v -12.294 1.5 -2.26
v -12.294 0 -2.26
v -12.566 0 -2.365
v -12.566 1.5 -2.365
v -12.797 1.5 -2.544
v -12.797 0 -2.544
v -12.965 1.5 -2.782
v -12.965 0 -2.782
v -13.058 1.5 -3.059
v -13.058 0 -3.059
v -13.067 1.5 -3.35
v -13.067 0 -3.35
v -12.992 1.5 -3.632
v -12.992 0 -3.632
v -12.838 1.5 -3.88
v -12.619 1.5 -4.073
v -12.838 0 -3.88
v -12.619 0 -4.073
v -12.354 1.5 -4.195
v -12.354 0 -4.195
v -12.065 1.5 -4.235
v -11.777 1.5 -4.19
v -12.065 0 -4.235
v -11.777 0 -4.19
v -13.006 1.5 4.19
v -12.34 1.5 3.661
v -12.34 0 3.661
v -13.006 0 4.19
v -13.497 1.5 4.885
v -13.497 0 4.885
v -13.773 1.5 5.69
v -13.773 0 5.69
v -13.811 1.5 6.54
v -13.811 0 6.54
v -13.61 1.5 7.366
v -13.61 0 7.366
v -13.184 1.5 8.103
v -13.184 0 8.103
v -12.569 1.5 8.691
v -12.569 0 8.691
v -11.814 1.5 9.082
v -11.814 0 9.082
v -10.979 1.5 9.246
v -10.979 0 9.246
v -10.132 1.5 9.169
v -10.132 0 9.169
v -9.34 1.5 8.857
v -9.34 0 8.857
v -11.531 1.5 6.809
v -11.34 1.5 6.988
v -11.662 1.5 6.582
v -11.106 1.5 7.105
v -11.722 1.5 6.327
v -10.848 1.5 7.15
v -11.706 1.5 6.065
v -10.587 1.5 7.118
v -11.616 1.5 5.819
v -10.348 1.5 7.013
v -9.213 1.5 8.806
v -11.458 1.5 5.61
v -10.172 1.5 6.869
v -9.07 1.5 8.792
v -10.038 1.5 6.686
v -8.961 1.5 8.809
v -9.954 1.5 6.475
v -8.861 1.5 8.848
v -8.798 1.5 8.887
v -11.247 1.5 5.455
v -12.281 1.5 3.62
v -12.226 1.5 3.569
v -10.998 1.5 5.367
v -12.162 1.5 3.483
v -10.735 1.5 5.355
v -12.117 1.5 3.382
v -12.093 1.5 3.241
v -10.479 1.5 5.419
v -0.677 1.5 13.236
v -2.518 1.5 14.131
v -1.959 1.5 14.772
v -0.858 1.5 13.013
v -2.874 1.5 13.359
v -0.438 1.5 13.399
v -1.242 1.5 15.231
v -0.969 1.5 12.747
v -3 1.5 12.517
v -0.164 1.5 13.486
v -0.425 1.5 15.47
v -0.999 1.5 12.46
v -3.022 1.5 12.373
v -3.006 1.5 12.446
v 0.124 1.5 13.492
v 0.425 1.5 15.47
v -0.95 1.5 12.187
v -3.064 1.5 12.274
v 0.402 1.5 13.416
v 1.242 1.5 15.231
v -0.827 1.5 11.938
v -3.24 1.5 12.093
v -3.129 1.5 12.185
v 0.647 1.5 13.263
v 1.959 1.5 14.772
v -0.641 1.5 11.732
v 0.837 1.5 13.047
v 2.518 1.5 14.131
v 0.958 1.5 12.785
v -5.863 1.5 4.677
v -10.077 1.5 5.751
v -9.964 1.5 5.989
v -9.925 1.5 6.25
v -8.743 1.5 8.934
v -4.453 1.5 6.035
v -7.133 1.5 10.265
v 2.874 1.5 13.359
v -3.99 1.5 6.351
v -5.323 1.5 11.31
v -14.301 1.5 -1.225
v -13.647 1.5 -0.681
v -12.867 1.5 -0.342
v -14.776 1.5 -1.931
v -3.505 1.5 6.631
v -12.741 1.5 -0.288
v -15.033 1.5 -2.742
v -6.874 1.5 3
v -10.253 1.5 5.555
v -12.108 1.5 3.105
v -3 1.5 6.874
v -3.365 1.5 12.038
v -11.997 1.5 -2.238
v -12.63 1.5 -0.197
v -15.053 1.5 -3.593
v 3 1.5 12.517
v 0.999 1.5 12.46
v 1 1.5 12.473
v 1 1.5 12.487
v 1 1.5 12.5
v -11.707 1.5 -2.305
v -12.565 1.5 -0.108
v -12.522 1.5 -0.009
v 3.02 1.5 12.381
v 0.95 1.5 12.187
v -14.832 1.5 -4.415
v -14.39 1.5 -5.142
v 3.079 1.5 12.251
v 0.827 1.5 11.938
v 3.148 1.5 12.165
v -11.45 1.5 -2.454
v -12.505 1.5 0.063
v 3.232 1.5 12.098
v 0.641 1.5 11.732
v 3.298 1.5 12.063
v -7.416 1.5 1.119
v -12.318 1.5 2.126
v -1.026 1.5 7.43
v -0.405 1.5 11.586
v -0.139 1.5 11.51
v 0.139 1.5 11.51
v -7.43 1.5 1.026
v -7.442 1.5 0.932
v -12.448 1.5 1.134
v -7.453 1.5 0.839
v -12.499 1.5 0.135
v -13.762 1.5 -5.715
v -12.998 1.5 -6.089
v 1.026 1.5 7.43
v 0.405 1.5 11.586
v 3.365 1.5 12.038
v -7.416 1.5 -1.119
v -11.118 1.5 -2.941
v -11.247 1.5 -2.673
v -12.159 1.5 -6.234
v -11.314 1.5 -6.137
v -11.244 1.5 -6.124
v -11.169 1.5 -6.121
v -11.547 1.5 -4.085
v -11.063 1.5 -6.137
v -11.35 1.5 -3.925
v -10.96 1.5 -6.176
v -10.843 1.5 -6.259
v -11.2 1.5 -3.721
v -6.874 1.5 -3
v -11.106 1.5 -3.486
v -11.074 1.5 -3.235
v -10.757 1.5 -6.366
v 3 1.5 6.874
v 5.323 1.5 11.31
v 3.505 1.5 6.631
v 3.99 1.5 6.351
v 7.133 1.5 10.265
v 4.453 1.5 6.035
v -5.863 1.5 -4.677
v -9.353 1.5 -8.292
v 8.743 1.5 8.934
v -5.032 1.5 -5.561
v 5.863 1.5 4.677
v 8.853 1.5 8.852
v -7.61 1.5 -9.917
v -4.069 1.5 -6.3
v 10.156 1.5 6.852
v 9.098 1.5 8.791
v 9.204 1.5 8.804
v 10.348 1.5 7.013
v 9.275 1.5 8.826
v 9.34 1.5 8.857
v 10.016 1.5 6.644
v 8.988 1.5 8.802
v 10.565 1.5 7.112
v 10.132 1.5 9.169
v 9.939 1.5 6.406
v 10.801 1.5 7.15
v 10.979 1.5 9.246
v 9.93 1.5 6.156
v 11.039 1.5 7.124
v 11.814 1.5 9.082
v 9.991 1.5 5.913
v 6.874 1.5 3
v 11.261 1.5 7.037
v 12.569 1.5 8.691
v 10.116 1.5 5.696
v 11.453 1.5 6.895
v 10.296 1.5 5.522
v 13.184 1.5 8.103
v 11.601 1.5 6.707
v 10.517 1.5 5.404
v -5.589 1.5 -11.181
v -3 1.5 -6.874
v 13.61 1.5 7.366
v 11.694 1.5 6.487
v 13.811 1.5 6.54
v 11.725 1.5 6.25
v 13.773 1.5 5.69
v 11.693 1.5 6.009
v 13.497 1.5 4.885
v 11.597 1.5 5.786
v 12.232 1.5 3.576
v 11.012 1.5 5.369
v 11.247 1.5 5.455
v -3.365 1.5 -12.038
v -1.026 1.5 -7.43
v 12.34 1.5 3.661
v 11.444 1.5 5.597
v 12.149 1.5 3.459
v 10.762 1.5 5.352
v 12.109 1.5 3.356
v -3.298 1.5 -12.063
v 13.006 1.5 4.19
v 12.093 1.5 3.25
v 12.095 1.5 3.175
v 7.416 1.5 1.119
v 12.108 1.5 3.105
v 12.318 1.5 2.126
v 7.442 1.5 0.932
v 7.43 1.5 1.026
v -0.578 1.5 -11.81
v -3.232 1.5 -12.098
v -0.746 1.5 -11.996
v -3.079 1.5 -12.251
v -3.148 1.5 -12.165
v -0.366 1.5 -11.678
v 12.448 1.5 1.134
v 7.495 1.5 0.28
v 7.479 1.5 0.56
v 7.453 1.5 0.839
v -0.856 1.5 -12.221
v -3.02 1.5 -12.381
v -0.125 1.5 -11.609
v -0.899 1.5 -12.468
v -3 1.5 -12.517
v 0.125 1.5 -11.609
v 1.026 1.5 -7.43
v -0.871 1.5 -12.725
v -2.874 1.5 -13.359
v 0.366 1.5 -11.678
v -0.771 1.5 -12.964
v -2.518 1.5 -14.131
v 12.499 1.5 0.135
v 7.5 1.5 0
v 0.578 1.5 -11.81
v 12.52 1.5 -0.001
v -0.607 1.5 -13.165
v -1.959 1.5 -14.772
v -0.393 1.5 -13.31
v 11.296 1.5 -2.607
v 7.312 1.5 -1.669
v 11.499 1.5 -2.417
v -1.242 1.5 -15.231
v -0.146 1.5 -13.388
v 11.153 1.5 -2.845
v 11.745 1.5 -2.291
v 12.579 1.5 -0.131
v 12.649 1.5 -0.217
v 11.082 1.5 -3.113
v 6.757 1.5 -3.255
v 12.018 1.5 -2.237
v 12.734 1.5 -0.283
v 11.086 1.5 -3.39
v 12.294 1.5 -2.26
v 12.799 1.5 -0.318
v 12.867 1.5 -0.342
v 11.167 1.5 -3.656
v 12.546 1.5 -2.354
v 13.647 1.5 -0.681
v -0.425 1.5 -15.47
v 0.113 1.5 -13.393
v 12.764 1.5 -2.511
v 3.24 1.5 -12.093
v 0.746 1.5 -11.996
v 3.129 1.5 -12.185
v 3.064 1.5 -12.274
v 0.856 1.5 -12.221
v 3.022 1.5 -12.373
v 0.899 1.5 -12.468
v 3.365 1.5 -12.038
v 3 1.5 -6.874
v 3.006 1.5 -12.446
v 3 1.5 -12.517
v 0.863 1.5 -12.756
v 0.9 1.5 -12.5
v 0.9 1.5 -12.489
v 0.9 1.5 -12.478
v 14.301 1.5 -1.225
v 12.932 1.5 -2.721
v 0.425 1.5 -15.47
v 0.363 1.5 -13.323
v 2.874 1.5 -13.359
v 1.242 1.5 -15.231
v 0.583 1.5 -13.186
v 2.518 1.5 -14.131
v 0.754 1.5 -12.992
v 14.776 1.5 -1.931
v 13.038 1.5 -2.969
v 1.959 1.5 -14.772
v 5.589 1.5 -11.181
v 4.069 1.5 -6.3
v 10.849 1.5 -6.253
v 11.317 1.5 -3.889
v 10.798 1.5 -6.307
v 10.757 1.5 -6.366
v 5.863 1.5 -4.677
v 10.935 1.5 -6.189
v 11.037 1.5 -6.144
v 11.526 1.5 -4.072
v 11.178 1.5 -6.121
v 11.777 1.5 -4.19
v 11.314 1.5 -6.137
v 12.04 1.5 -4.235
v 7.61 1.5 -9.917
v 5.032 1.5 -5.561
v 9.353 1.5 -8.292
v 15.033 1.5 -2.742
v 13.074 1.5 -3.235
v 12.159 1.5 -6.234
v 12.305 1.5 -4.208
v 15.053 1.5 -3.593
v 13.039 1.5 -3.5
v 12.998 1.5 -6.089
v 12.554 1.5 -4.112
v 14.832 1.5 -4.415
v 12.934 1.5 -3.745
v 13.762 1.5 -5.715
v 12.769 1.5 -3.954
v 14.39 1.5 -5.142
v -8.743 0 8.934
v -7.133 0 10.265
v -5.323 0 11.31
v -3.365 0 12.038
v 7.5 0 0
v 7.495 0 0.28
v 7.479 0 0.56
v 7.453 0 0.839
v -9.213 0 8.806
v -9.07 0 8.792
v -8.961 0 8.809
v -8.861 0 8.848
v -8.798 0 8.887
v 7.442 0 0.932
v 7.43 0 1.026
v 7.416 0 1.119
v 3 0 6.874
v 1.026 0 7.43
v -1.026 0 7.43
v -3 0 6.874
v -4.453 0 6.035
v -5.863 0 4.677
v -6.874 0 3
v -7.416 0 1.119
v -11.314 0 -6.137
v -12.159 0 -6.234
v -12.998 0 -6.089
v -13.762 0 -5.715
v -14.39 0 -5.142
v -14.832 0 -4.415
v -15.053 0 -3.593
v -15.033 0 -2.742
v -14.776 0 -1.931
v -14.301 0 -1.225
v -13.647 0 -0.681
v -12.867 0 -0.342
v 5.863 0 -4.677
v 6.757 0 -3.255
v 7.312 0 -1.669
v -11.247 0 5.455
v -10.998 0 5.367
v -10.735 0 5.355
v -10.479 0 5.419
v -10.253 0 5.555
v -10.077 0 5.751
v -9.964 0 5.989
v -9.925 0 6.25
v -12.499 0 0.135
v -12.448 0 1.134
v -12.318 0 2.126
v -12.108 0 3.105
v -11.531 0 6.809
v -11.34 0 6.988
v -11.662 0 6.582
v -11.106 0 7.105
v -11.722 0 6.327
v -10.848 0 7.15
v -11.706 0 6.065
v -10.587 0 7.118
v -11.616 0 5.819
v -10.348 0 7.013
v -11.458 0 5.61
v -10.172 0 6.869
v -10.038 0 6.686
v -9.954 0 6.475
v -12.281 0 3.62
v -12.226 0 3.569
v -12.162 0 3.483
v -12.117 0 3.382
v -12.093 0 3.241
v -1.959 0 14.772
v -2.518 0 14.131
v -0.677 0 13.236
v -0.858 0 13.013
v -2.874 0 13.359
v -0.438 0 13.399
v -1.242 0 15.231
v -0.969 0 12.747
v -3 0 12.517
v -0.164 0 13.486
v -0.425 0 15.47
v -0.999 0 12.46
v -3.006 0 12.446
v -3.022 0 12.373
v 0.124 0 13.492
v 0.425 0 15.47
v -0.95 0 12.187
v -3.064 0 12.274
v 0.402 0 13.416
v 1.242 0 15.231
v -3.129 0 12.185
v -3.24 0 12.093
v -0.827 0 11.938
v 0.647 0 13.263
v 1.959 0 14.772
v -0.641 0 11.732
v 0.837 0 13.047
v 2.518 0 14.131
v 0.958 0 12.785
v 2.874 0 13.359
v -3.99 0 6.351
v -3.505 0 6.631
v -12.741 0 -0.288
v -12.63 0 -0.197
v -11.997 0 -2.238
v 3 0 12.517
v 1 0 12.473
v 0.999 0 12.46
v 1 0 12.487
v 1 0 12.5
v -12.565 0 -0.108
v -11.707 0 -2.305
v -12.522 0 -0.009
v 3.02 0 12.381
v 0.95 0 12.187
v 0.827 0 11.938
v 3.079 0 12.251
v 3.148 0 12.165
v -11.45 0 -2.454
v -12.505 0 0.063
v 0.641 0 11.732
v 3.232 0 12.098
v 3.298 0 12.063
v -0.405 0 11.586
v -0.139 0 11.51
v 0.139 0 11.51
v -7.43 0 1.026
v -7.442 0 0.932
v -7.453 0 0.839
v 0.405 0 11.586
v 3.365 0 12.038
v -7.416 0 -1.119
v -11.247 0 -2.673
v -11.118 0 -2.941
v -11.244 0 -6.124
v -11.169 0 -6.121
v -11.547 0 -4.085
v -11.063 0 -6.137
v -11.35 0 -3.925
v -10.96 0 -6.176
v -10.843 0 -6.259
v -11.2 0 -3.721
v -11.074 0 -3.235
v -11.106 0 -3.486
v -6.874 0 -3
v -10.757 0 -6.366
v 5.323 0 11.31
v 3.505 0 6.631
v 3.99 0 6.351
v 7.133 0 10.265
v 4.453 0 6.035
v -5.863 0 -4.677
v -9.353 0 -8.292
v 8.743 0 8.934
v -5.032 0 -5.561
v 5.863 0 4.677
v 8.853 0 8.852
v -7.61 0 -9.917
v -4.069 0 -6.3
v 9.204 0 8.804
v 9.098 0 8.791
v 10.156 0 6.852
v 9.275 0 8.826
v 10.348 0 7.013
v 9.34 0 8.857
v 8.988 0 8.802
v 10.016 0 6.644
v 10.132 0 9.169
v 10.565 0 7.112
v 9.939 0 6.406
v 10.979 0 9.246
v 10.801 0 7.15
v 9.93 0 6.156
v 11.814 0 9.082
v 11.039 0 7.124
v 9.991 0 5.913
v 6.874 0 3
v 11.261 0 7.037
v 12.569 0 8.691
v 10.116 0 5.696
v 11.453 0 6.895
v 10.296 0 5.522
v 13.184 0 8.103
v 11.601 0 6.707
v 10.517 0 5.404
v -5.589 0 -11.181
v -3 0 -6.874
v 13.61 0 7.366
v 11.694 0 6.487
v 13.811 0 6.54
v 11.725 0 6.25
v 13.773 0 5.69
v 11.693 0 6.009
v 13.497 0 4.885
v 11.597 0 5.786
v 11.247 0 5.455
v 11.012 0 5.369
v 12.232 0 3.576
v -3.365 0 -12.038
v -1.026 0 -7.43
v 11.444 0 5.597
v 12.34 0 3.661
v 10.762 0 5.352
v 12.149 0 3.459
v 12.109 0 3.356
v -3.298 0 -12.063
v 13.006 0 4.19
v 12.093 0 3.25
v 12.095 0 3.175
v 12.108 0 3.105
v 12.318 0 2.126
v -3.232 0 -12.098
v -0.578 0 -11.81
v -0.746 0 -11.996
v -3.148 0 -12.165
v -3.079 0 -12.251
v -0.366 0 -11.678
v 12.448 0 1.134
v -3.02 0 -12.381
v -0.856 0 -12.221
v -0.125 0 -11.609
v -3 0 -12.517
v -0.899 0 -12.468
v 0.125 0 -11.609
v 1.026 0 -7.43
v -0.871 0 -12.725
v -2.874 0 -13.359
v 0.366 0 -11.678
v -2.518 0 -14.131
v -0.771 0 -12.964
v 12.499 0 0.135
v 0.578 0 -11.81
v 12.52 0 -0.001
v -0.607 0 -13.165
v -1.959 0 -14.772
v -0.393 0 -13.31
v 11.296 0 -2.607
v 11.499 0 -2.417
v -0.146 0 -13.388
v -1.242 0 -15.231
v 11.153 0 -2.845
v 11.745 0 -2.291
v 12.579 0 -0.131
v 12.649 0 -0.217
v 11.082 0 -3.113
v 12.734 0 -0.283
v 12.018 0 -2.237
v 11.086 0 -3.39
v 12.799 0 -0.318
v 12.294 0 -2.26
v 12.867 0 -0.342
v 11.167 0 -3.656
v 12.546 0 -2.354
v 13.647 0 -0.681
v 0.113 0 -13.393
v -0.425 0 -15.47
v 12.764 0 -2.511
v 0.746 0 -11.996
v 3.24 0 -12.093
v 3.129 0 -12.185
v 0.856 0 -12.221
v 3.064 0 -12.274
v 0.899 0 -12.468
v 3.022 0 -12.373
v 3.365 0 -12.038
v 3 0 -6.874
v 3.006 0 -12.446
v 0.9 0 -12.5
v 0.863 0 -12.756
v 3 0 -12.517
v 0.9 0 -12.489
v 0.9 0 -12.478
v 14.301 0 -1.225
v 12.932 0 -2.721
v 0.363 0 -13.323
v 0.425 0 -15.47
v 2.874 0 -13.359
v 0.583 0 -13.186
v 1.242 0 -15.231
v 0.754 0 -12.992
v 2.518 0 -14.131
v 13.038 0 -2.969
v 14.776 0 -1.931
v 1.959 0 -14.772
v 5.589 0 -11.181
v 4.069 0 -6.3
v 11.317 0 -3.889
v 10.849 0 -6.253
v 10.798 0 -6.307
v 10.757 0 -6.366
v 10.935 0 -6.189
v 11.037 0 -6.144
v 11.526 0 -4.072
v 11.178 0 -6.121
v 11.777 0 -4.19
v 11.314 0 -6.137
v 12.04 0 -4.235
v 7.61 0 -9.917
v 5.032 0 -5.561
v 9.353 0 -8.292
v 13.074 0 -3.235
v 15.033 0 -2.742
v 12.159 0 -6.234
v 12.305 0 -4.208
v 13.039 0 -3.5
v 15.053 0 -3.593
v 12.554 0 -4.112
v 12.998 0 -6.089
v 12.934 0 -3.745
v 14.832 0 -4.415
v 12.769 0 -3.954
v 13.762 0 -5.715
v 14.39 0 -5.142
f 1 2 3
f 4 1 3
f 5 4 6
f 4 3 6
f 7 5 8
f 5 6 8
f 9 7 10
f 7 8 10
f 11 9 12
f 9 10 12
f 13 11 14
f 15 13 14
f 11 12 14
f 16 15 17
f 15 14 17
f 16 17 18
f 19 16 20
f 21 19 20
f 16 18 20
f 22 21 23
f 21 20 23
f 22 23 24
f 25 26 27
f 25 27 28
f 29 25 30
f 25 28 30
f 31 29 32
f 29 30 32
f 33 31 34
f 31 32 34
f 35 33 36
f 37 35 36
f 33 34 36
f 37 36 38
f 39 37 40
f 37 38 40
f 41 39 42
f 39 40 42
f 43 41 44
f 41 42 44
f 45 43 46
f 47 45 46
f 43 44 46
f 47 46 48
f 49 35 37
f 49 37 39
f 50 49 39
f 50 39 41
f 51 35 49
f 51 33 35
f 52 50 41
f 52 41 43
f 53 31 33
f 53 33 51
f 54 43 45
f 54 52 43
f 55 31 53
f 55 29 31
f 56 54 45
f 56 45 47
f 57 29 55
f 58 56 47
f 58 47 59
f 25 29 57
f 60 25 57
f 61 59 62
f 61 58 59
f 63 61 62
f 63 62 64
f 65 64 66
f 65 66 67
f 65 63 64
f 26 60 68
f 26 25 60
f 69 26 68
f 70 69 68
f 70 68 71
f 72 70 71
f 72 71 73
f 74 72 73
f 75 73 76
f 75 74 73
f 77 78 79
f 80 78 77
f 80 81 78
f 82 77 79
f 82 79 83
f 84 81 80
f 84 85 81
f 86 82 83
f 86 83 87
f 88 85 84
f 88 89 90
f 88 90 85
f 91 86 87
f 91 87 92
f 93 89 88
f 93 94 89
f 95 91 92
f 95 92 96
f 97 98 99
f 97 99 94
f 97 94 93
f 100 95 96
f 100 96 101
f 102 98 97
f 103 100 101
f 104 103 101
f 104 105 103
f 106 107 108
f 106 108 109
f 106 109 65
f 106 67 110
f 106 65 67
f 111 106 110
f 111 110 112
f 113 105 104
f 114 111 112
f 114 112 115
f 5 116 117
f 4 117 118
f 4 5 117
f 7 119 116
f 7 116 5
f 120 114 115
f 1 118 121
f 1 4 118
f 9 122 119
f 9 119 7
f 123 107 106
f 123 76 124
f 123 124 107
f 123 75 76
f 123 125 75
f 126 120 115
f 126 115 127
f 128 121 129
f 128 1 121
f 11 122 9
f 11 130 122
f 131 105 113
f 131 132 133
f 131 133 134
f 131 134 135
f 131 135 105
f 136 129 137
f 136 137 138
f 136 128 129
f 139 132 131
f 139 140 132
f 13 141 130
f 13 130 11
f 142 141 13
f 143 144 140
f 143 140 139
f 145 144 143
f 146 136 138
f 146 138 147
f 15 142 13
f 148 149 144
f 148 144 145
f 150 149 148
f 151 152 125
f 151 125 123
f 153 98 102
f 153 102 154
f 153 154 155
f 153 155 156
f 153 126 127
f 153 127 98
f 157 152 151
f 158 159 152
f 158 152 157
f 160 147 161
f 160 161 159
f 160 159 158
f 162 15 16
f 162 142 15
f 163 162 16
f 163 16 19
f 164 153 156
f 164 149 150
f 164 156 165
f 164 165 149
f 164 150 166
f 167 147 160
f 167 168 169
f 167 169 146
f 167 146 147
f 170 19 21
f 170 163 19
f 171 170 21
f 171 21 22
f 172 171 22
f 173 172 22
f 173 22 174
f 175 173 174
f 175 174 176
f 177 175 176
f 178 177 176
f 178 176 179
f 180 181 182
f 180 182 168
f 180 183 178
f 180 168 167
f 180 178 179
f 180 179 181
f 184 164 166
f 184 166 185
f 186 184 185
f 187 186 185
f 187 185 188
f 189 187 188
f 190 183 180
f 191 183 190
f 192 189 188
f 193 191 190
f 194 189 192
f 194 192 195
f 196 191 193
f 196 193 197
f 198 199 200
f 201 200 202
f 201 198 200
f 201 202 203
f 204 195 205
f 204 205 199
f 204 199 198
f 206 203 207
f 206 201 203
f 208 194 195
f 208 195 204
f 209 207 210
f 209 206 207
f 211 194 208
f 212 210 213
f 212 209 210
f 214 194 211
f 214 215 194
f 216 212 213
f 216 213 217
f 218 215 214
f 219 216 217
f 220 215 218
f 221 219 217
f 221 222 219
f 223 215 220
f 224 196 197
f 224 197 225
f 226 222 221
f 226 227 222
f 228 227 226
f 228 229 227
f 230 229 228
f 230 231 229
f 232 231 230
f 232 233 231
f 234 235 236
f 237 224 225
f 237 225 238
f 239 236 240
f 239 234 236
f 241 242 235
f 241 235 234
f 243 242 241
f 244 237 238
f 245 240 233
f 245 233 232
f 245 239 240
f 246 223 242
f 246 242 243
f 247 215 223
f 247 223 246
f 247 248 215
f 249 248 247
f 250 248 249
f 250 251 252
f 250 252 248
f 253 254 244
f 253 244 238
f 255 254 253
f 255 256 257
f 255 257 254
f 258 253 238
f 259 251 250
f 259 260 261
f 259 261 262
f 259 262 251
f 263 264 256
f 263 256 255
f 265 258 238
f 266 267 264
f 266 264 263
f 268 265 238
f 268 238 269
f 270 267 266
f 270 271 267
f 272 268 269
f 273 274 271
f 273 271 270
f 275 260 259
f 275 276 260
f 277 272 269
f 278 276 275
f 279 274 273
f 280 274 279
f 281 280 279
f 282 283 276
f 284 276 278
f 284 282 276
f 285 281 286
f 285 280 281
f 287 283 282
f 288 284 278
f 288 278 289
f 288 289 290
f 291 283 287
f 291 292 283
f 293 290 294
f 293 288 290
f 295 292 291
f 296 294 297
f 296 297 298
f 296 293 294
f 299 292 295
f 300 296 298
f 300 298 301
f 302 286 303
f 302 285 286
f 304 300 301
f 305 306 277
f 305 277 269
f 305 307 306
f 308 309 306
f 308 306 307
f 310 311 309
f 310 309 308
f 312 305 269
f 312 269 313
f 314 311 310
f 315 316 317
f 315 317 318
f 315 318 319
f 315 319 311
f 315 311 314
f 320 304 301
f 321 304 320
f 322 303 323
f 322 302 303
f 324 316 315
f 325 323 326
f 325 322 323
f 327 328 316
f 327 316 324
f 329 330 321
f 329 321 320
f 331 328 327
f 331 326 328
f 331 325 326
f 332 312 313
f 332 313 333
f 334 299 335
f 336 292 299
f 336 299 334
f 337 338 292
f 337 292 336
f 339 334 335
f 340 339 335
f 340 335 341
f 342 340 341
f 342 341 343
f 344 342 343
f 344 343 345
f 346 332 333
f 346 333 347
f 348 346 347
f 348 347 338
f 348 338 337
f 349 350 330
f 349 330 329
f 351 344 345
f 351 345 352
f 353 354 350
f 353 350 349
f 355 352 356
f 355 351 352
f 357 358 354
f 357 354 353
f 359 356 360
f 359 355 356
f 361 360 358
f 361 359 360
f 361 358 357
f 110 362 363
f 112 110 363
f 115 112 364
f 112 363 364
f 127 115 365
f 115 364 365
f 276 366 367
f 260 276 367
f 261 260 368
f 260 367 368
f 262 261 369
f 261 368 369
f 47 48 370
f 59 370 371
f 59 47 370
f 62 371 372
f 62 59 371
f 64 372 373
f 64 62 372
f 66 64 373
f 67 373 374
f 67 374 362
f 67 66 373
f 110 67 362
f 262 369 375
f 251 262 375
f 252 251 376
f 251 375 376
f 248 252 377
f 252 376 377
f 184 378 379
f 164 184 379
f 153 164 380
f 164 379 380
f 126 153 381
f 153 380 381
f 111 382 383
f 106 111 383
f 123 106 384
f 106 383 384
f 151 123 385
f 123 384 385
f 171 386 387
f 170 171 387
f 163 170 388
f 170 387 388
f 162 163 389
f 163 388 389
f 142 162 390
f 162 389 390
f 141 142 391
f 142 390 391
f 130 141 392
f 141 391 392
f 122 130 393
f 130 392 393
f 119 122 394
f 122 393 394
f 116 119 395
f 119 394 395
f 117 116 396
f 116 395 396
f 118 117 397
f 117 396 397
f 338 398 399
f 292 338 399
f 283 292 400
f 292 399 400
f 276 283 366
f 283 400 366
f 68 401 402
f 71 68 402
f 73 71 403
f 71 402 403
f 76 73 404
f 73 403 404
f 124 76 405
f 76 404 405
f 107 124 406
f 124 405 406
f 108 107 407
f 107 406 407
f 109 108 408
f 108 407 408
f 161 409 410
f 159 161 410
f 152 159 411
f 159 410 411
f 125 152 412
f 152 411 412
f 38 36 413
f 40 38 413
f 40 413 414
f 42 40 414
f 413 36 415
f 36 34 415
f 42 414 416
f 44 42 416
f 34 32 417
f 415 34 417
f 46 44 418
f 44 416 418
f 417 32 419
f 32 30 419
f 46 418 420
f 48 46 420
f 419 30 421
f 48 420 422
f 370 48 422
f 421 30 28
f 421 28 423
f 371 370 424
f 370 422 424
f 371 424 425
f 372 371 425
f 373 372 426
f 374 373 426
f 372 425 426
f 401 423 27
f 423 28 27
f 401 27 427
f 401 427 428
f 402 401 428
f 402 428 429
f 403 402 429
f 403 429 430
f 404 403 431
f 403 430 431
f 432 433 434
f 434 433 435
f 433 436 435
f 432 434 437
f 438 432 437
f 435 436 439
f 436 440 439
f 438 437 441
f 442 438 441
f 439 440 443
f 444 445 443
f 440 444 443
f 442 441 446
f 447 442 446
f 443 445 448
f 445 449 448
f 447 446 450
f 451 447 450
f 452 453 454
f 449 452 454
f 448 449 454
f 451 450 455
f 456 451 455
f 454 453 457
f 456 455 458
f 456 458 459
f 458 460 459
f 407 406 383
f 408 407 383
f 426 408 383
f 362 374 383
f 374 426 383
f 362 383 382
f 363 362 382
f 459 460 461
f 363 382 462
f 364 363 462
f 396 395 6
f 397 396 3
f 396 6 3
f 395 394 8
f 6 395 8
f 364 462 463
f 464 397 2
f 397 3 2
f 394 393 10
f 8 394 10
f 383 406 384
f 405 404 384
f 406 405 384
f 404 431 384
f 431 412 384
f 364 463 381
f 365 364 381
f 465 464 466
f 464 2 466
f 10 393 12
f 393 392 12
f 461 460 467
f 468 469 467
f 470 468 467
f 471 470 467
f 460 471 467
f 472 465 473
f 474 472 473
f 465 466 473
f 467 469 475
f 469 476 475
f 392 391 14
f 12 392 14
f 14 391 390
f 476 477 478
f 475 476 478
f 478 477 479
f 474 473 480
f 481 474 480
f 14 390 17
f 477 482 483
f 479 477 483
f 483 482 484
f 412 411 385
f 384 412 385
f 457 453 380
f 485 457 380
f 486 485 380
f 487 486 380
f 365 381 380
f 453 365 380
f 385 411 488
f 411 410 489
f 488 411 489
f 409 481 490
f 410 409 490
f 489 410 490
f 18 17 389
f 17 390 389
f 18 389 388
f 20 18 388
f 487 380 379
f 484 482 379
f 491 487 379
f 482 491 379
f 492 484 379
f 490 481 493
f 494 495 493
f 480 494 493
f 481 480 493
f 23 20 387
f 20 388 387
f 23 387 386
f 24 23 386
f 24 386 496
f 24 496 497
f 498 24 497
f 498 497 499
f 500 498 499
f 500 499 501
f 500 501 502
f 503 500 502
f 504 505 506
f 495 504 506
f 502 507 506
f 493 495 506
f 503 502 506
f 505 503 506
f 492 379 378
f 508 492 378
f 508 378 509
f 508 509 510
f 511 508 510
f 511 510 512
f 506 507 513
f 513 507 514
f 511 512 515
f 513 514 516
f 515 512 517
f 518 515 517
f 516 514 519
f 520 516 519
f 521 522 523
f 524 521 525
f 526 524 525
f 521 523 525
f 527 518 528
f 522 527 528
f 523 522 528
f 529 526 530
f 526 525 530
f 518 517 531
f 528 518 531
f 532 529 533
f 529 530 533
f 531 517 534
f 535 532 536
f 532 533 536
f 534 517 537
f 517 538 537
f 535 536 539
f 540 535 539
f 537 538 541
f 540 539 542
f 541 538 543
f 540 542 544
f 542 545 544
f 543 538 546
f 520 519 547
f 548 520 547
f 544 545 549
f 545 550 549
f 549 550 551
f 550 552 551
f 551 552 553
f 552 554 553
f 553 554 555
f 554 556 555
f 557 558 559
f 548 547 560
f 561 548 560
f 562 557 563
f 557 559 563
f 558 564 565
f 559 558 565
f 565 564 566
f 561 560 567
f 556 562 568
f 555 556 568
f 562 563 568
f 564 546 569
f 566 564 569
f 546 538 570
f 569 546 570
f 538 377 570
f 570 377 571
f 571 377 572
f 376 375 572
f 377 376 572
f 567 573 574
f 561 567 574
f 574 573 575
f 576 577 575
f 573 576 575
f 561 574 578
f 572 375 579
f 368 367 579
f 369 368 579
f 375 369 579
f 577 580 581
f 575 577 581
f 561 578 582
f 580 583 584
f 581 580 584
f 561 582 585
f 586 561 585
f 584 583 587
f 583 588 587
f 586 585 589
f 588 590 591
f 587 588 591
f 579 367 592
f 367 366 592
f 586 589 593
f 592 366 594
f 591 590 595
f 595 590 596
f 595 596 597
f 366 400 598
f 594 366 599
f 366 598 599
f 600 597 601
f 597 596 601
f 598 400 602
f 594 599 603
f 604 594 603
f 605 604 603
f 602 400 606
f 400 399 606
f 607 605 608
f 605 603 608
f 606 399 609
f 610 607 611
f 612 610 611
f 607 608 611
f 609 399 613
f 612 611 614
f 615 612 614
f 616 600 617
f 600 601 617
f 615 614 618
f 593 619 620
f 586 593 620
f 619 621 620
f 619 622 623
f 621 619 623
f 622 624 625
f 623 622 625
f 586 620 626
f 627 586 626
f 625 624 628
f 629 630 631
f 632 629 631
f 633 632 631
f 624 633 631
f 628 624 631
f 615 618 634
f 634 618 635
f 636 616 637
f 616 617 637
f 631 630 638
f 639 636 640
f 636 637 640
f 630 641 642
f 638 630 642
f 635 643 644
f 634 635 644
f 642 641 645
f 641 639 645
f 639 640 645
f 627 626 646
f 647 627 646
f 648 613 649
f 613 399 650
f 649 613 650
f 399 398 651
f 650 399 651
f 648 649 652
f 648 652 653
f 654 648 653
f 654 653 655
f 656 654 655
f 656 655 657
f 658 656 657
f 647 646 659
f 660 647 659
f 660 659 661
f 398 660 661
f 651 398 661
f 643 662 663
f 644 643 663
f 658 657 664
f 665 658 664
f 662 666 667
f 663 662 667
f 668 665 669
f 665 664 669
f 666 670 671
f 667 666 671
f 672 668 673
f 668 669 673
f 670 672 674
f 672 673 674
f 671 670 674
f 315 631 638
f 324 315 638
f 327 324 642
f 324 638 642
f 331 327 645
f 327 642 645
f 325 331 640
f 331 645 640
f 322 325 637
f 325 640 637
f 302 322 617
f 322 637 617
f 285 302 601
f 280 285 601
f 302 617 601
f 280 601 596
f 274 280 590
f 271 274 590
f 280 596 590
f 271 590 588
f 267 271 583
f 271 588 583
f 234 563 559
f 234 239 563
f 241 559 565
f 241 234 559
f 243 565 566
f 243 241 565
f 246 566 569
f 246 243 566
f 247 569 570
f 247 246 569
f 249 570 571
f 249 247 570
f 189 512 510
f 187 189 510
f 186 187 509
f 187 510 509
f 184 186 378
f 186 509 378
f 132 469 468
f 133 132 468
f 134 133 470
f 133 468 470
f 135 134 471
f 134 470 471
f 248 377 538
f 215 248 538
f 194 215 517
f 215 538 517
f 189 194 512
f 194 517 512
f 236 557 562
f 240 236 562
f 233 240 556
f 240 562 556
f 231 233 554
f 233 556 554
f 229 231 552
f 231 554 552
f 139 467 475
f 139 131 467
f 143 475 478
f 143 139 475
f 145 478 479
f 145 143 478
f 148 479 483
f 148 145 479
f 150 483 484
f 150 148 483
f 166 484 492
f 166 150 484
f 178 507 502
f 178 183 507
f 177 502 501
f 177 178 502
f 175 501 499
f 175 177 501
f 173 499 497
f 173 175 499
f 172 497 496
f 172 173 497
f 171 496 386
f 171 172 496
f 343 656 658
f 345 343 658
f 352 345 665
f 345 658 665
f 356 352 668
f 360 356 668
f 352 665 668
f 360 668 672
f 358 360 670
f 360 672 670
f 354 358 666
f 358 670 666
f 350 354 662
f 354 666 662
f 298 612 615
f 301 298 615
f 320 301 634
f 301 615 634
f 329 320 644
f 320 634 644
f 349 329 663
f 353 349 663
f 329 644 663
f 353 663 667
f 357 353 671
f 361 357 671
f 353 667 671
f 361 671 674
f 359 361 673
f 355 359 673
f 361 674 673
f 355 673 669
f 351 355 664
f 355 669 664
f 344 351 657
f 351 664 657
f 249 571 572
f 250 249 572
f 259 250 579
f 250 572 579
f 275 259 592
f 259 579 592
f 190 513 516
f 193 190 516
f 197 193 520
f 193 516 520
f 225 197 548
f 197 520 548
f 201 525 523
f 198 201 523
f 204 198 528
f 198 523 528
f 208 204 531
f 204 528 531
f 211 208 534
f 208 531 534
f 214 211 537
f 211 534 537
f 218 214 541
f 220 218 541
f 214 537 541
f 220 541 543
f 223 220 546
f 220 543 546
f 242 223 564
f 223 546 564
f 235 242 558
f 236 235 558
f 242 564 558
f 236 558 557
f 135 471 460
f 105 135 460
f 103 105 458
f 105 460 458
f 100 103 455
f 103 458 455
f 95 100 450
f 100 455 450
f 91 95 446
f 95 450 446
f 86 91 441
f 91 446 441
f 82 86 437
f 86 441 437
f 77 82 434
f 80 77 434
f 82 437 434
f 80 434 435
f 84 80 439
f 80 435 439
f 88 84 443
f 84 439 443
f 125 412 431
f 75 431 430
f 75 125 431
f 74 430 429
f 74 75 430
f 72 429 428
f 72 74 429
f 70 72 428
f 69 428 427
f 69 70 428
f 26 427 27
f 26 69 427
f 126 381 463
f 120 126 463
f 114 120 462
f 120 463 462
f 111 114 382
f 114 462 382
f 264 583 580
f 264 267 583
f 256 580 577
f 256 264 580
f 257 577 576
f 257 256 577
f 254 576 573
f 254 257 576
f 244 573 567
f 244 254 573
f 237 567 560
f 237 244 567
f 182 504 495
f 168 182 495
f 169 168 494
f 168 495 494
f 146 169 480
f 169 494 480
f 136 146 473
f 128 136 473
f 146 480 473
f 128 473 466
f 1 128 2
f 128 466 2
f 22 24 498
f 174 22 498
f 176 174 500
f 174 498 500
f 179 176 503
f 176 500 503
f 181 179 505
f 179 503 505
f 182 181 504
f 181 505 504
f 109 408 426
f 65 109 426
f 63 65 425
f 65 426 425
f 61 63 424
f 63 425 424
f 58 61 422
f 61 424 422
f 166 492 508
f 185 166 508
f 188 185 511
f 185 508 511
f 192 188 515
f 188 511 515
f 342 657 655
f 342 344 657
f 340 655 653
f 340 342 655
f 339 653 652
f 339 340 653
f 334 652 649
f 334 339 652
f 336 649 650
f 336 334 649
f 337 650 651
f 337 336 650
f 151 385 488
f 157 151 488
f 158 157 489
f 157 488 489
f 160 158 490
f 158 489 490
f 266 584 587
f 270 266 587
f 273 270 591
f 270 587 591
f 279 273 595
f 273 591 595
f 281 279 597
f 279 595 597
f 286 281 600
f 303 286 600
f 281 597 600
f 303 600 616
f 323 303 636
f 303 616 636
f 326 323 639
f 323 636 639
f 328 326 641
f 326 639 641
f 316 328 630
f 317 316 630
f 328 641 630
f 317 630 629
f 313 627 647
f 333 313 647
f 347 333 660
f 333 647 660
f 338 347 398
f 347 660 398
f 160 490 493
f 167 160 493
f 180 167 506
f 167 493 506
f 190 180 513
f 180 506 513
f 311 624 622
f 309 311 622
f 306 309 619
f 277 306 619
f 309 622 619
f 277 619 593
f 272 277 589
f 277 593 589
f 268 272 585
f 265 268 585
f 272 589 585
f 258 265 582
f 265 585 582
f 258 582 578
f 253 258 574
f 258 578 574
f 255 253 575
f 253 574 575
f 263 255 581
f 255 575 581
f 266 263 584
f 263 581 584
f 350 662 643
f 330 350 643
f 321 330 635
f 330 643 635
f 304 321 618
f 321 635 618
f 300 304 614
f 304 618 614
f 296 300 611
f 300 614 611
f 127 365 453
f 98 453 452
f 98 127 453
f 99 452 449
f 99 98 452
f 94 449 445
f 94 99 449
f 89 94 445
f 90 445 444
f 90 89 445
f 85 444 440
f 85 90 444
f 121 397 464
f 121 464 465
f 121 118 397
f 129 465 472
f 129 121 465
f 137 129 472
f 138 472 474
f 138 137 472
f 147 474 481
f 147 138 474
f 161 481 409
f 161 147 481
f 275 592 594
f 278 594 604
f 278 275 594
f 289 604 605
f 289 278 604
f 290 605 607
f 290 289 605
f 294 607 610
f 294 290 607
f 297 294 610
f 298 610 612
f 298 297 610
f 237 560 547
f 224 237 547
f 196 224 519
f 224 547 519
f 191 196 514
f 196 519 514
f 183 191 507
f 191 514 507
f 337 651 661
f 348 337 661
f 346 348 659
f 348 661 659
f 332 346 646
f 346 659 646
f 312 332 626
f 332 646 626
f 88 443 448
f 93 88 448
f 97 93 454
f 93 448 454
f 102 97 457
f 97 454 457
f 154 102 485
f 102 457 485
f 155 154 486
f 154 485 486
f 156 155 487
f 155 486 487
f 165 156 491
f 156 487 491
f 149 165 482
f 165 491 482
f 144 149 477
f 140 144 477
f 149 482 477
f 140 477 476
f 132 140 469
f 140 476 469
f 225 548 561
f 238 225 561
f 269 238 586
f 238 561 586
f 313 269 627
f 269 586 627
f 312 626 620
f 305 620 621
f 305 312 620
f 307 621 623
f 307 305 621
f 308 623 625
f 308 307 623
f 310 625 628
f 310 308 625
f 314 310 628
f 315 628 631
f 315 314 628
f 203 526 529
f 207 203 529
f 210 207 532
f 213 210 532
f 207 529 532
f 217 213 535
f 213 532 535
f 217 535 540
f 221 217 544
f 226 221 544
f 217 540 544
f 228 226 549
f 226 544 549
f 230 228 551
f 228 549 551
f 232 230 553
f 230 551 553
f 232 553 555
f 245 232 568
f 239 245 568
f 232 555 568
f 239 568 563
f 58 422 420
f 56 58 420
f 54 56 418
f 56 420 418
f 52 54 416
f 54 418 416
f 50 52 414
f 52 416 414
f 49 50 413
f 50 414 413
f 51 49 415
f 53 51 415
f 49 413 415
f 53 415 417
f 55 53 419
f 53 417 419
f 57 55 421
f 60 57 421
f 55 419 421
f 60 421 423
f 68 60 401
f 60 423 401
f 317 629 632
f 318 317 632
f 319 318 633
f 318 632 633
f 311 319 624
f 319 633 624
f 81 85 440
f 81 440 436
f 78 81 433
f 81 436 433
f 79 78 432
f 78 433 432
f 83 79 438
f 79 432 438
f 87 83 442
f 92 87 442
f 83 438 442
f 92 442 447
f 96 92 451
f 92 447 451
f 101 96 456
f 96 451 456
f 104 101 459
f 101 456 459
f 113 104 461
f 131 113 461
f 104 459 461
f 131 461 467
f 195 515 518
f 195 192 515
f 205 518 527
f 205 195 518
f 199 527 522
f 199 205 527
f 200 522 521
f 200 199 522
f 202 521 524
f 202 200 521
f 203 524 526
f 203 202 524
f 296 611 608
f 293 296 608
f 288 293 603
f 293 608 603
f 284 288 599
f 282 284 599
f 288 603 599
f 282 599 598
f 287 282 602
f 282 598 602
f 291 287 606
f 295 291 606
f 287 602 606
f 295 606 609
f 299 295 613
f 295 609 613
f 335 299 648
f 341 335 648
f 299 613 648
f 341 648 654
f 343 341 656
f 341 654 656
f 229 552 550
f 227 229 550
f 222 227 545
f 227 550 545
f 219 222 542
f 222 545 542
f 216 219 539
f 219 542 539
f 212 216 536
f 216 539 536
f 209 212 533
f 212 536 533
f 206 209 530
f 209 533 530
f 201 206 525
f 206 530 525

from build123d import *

# Parameters (mm, degrees)
BOSS_EXTRUDE1_DEPTH = 1.5
FILLET1_R           = 0.5


with BuildPart() as part:
    # Sketch1 → Boss-Extrude1 (new body)
    with BuildSketch(Plane(origin=(0, 0, 0), x_dir=(1, 0, 0), z_dir=(0, 1, 0))):
        with BuildLine():
            ThreePointArc((0.899416611, 12.4676), (1.956802124, 12.345886985), (3, 12.1346611))
            Line((3, 12.1346611), (3, 12.5))
            ThreePointArc((3, 12.5), (0, 15.5), (-3, 12.5))
            Line((-3, 12.5), (-3, 12.1346611))
            ThreePointArc((-3, 12.1346611), (-1.956802124, 12.345886985), (-0.899416611, 12.4676))
            ThreePointArc((-0.899416611, 12.4676), (-0.016202626, 13.399854141), (0.9, 12.5))
            ThreePointArc((0.9, 12.5), (0.899854141, 12.483797374), (0.899416611, 12.4676))
        make_face()
        with BuildLine():
            ThreePointArc((-3, 6.873863542), (0, 7.5), (3, 6.873863542))
            Line((3, 6.873863542), (3, 12.1346611))
            ThreePointArc((3, 12.1346611), (1.956802124, 12.345886985), (0.899416611, 12.4676))
            ThreePointArc((0.899416611, 12.4676), (0, 11.6), (-0.899416611, 12.4676))
            ThreePointArc((-0.899416611, 12.4676), (-1.956802124, 12.345886985), (-3, 12.1346611))
            Line((-3, 12.1346611), (-3, 6.873863542))
        make_face()
        with BuildLine():
            Line((3, 12.1346611), (3, 6.873863542))
            ThreePointArc((3, 6.873863542), (4.565710718, 5.950150052), (5.863185187, 4.676864277))
            Line((5.863185187, 4.676864277), (10.944725414, 6.038458877))
            ThreePointArc((10.944725414, 6.038458877), (7.609517863, 9.916916754), (3, 12.1346611))
        make_face()
        with BuildLine():
            ThreePointArc((7.5, 0), (7.48822587, -0.420087268), (7.45294045, -0.83885556))
            Line((7.45294045, -0.83885556), (7.772310826, -1.023244132))
            Line((7.772310826, -1.023244132), (12.497639685, 0.24290392))
            ThreePointArc((12.497639685, 0.24290392), (12.43679381, 1.255451998), (12.294047703, 2.259732526))
            ThreePointArc((12.294047703, 2.259732526), (11.108147002, 2.976419019), (11.776823889, 4.190038078))
            ThreePointArc((11.776823889, 4.190038078), (11.39830538, 5.131143582), (10.944725414, 6.038458877))
            Line((10.944725414, 6.038458877), (5.863185187, 4.676864277))
            ThreePointArc((5.863185187, 4.676864277), (7.078979054, 2.477509949), (7.5, 0))
        make_face()
        with BuildLine():
            ThreePointArc((12.294047703, 2.259732526), (12.43679381, 1.255451998), (12.497639685, 0.24290392))
            Line((12.497639685, 0.24290392), (12.850529964, 0.337460585))
            ThreePointArc((12.850529964, 0.337460585), (14.971850307, 4.011695199), (11.297615693, 6.133015543))
            Line((11.297615693, 6.133015543), (10.944725414, 6.038458877))
            ThreePointArc((10.944725414, 6.038458877), (11.39830538, 5.131143582), (11.776823889, 4.190038078))
            ThreePointArc((11.776823889, 4.190038078), (12.666842202, 4.040610319), (13.074072829, 3.235238064))
            ThreePointArc((13.074072829, 3.235238064), (12.855089754, 2.610728206), (12.294047703, 2.259732526))
        make_face()
        with BuildLine():
            Line((12.497639685, 0.24290392), (7.772310826, -1.023244132))
            Line((7.772310826, -1.023244132), (12.008924778, -3.469254338))
            ThreePointArc((12.008924778, -3.469254338), (12.376622312, -1.751918986), (12.5, 0))
            ThreePointArc((12.5, 0), (12.499409907, 0.121457693), (12.497639685, 0.24290392))
        make_face()
        with BuildLine():
            ThreePointArc((7.45294045, -0.83885556), (7.43583646, -0.978946442), (7.416099457, -1.118690681))
            Line((7.416099457, -1.118690681), (7.772310826, -1.023244132))
            Line((7.772310826, -1.023244132), (7.45294045, -0.83885556))
        make_face()
        with BuildLine():
            Line((7.772310826, -1.023244132), (7.416099457, -1.118690681))
            ThreePointArc((7.416099457, -1.118690681), (6.42347811, -3.871553818), (4.45294045, -6.035007983))
            Line((4.45294045, -6.035007983), (9.008924778, -8.665406761))
            ThreePointArc((9.008924778, -8.665406761), (9.713450699, -7.867583842), (10.347550019, -7.012717634))
            ThreePointArc((10.347550019, -7.012717634), (10.045894684, -5.8), (11.24696663, -5.454882366))
            ThreePointArc((11.24696663, -5.454882366), (11.670252823, -4.478303143), (12.008924778, -3.469254338))
            Line((12.008924778, -3.469254338), (7.772310826, -1.023244132))
        make_face()
        with BuildLine():
            ThreePointArc((10.347550019, -7.012717634), (9.713450699, -7.867583842), (9.008924778, -8.665406761))
            Line((9.008924778, -8.665406761), (9.325317547, -8.848076211))
            ThreePointArc((9.325317547, -8.848076211), (13.423393759, -7.75), (12.325317547, -3.651923789))
            Line((12.325317547, -3.651923789), (12.008924778, -3.469254338))
            ThreePointArc((12.008924778, -3.469254338), (11.670252823, -4.478303143), (11.24696663, -5.454882366))
            ThreePointArc((11.24696663, -5.454882366), (11.59651278, -5.786041044), (11.725317547, -6.25))
            ThreePointArc((11.725317547, -6.25), (11.261212732, -7.037397859), (10.347550019, -7.012717634))
        make_face()
        with BuildLine():
            ThreePointArc((4.45294045, -6.035007983), (3.75, -6.495190528), (3, -6.873863542))
            Line((3, -6.873863542), (3, -12.1346611))
            ThreePointArc((3, -12.1346611), (6.25, -10.825317547), (9.008924778, -8.665406761))
            Line((9.008924778, -8.665406761), (4.45294045, -6.035007983))
        make_face()
        with BuildLine():
            Line((3, -12.1346611), (3, -6.873863542))
            ThreePointArc((3, -6.873863542), (0, -7.5), (-3, -6.873863542))
            Line((-3, -6.873863542), (-3, -12.1346611))
            ThreePointArc((-3, -12.1346611), (-2.00620559, -12.337955225), (-0.99919968, -12.46))
            ThreePointArc((-0.99919968, -12.46), (0, -11.5), (0.99919968, -12.46))
            ThreePointArc((0.99919968, -12.46), (2.00620559, -12.337955225), (3, -12.1346611))
        make_face()
        with BuildLine():
            Line((3, -12.5), (3, -12.1346611))
            ThreePointArc((3, -12.1346611), (2.00620559, -12.337955225), (0.99919968, -12.46))
            ThreePointArc((0.99919968, -12.46), (0.9997999, -12.479995997), (1, -12.5))
            ThreePointArc((1, -12.5), (-0.020004003, -13.4997999), (-0.99919968, -12.46))
            ThreePointArc((-0.99919968, -12.46), (-2.00620559, -12.337955225), (-3, -12.1346611))
            Line((-3, -12.1346611), (-3, -12.5))
            ThreePointArc((-3, -12.5), (0, -15.5), (3, -12.5))
        make_face()
        with BuildLine():
            Line((-3, -12.1346611), (-3, -6.873863542))
            ThreePointArc((-3, -6.873863542), (-3.75, -6.495190528), (-4.45294045, -6.035007983))
            Line((-4.45294045, -6.035007983), (-9.008924778, -8.665406761))
            ThreePointArc((-9.008924778, -8.665406761), (-6.25, -10.825317547), (-3, -12.1346611))
        make_face()
        with BuildLine():
            Line((-9.008924778, -8.665406761), (-4.45294045, -6.035007983))
            ThreePointArc((-4.45294045, -6.035007983), (-6.42347811, -3.871553818), (-7.416099457, -1.118690681))
            Line((-7.416099457, -1.118690681), (-7.772310826, -1.023244132))
            Line((-7.772310826, -1.023244132), (-12.008924778, -3.469254338))
            ThreePointArc((-12.008924778, -3.469254338), (-11.670252823, -4.478303143), (-11.24696663, -5.454882366))
            ThreePointArc((-11.24696663, -5.454882366), (-10.361358591, -5.478804767), (-9.925317547, -6.25))
            ThreePointArc((-9.925317547, -6.25), (-10.037919689, -6.685895185), (-10.347550019, -7.012717634))
            ThreePointArc((-10.347550019, -7.012717634), (-9.713450699, -7.867583842), (-9.008924778, -8.665406761))
        make_face()
        with BuildLine():
            Line((-9.325317547, -8.848076211), (-9.008924778, -8.665406761))
            ThreePointArc((-9.008924778, -8.665406761), (-9.713450699, -7.867583842), (-10.347550019, -7.012717634))
            ThreePointArc((-10.347550019, -7.012717634), (-11.604740411, -6.7), (-11.24696663, -5.454882366))
            ThreePointArc((-11.24696663, -5.454882366), (-11.670252823, -4.478303143), (-12.008924778, -3.469254338))
            Line((-12.008924778, -3.469254338), (-12.325317547, -3.651923789))
            ThreePointArc((-12.325317547, -3.651923789), (-13.423393759, -7.75), (-9.325317547, -8.848076211))
        make_face()
        with BuildLine():
            Line((-7.772310826, -1.023244132), (-7.416099457, -1.118690681))
            ThreePointArc((-7.416099457, -1.118690681), (-7.43583646, -0.978946442), (-7.45294045, -0.83885556))
            Line((-7.45294045, -0.83885556), (-7.772310826, -1.023244132))
        make_face()
        with BuildLine():
            Line((-12.008924778, -3.469254338), (-7.772310826, -1.023244132))
            Line((-7.772310826, -1.023244132), (-12.497639685, 0.24290392))
            ThreePointArc((-12.497639685, 0.24290392), (-12.393060767, -1.631577403), (-12.008924778, -3.469254338))
        make_face()
        with BuildLine():
            ThreePointArc((-7.45294045, -0.83885556), (-7.206635264, 2.07711535), (-5.863185187, 4.676864277))
            Line((-5.863185187, 4.676864277), (-10.944725414, 6.038458877))
            ThreePointArc((-10.944725414, 6.038458877), (-11.39830538, 5.131143582), (-11.776823889, 4.190038078))
            ThreePointArc((-11.776823889, 4.190038078), (-11.268700573, 3.828007437), (-11.074072829, 3.235238064))
            ThreePointArc((-11.074072829, 3.235238064), (-11.44956297, 2.454221139), (-12.294047703, 2.259732526))
            ThreePointArc((-12.294047703, 2.259732526), (-12.43679381, 1.255451998), (-12.497639685, 0.24290392))
            Line((-12.497639685, 0.24290392), (-7.772310826, -1.023244132))
            Line((-7.772310826, -1.023244132), (-7.45294045, -0.83885556))
        make_face()
        with BuildLine():
            ThreePointArc((-11.776823889, 4.190038078), (-11.39830538, 5.131143582), (-10.944725414, 6.038458877))
            Line((-10.944725414, 6.038458877), (-11.297615693, 6.133015543))
            ThreePointArc((-11.297615693, 6.133015543), (-14.971850307, 4.011695199), (-12.850529964, 0.337460585))
            Line((-12.850529964, 0.337460585), (-12.497639685, 0.24290392))
            ThreePointArc((-12.497639685, 0.24290392), (-12.43679381, 1.255451998), (-12.294047703, 2.259732526))
            ThreePointArc((-12.294047703, 2.259732526), (-13.039998655, 3.494057109), (-11.776823889, 4.190038078))
        make_face()
        with BuildLine():
            ThreePointArc((-5.863185187, 4.676864277), (-4.565710718, 5.950150052), (-3, 6.873863542))
            Line((-3, 6.873863542), (-3, 12.1346611))
            ThreePointArc((-3, 12.1346611), (-7.609517863, 9.916916754), (-10.944725414, 6.038458877))
            Line((-10.944725414, 6.038458877), (-5.863185187, 4.676864277))
        make_face()
    extrude(amount=BOSS_EXTRUDE1_DEPTH)

    # Fillet1
    fillet1_edges = [part.edges().sort_by_distance(p)[0] for p in [
        (-3, 0.75, 12.1346611),
        (3, 0.75, 12.1346611),
        (9.008924778, 0.75, 8.665406761),
        (12.008924778, 0.75, 3.469254338),
        (12.497639685, 0.75, -0.24290392),
        (10.944725414, 0.75, -6.038458877),
        (3, 0.75, -12.1346611),
        (-3, 0.75, -12.1346611),
        (-10.944725414, 0.75, -6.038458877),
        (-12.497639685, 0.75, -0.24290392),
        (-12.008924778, 0.75, 3.469254338),
        (-9.008924778, 0.75, 8.665406761),
    ]]
    fillet(fillet1_edges, radius=FILLET1_R)


solid = part.part
